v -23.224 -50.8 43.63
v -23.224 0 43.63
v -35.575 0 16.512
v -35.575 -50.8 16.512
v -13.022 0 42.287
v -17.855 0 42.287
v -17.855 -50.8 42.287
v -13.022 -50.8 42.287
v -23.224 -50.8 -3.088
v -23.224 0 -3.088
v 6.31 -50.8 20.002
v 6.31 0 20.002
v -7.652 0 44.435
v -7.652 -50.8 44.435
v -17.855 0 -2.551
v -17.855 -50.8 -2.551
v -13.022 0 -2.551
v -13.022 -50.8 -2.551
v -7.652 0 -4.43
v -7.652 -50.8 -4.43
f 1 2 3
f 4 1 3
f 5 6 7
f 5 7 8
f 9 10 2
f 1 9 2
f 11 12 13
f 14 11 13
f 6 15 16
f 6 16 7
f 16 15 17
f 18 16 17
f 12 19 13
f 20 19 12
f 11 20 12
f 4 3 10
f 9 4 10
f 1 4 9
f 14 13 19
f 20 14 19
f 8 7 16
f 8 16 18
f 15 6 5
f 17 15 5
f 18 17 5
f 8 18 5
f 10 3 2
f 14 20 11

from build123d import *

# Parameters (mm, degrees)
F1_DEPTH = 50.8
F2_W     = 4.832819
F2_H     = 44.837821
F3_DEPTH = 50.8
F5_DEPTH = 50.8


with BuildPart() as f1:
    # F0 (on Front) → F1 (new body)
    with BuildSketch(Plane.XZ):
        Polygon((-23.22438, -3.087634), (-23.22438, 43.629616), (-35.574917, 16.512131), align=None)
    extrude(amount=F1_DEPTH)


with BuildPart() as f3:
    # F2 (on Front) → F3 (new body)
    with BuildSketch(Plane.XZ):
        with Locations((-15.438171, 19.868256)):
            Rectangle(F2_W, F2_H)
    extrude(amount=F3_DEPTH)


with BuildPart() as f5:
    # F4 (on Front) → F5 (new body)
    with BuildSketch(Plane.XZ):
        Polygon((6.309514, 20.0025), (-7.651964, 44.435084), (-7.651964, -4.430084), align=None)
    extrude(amount=F5_DEPTH)


solid = Compound([f1.part, f3.part, f5.part])
